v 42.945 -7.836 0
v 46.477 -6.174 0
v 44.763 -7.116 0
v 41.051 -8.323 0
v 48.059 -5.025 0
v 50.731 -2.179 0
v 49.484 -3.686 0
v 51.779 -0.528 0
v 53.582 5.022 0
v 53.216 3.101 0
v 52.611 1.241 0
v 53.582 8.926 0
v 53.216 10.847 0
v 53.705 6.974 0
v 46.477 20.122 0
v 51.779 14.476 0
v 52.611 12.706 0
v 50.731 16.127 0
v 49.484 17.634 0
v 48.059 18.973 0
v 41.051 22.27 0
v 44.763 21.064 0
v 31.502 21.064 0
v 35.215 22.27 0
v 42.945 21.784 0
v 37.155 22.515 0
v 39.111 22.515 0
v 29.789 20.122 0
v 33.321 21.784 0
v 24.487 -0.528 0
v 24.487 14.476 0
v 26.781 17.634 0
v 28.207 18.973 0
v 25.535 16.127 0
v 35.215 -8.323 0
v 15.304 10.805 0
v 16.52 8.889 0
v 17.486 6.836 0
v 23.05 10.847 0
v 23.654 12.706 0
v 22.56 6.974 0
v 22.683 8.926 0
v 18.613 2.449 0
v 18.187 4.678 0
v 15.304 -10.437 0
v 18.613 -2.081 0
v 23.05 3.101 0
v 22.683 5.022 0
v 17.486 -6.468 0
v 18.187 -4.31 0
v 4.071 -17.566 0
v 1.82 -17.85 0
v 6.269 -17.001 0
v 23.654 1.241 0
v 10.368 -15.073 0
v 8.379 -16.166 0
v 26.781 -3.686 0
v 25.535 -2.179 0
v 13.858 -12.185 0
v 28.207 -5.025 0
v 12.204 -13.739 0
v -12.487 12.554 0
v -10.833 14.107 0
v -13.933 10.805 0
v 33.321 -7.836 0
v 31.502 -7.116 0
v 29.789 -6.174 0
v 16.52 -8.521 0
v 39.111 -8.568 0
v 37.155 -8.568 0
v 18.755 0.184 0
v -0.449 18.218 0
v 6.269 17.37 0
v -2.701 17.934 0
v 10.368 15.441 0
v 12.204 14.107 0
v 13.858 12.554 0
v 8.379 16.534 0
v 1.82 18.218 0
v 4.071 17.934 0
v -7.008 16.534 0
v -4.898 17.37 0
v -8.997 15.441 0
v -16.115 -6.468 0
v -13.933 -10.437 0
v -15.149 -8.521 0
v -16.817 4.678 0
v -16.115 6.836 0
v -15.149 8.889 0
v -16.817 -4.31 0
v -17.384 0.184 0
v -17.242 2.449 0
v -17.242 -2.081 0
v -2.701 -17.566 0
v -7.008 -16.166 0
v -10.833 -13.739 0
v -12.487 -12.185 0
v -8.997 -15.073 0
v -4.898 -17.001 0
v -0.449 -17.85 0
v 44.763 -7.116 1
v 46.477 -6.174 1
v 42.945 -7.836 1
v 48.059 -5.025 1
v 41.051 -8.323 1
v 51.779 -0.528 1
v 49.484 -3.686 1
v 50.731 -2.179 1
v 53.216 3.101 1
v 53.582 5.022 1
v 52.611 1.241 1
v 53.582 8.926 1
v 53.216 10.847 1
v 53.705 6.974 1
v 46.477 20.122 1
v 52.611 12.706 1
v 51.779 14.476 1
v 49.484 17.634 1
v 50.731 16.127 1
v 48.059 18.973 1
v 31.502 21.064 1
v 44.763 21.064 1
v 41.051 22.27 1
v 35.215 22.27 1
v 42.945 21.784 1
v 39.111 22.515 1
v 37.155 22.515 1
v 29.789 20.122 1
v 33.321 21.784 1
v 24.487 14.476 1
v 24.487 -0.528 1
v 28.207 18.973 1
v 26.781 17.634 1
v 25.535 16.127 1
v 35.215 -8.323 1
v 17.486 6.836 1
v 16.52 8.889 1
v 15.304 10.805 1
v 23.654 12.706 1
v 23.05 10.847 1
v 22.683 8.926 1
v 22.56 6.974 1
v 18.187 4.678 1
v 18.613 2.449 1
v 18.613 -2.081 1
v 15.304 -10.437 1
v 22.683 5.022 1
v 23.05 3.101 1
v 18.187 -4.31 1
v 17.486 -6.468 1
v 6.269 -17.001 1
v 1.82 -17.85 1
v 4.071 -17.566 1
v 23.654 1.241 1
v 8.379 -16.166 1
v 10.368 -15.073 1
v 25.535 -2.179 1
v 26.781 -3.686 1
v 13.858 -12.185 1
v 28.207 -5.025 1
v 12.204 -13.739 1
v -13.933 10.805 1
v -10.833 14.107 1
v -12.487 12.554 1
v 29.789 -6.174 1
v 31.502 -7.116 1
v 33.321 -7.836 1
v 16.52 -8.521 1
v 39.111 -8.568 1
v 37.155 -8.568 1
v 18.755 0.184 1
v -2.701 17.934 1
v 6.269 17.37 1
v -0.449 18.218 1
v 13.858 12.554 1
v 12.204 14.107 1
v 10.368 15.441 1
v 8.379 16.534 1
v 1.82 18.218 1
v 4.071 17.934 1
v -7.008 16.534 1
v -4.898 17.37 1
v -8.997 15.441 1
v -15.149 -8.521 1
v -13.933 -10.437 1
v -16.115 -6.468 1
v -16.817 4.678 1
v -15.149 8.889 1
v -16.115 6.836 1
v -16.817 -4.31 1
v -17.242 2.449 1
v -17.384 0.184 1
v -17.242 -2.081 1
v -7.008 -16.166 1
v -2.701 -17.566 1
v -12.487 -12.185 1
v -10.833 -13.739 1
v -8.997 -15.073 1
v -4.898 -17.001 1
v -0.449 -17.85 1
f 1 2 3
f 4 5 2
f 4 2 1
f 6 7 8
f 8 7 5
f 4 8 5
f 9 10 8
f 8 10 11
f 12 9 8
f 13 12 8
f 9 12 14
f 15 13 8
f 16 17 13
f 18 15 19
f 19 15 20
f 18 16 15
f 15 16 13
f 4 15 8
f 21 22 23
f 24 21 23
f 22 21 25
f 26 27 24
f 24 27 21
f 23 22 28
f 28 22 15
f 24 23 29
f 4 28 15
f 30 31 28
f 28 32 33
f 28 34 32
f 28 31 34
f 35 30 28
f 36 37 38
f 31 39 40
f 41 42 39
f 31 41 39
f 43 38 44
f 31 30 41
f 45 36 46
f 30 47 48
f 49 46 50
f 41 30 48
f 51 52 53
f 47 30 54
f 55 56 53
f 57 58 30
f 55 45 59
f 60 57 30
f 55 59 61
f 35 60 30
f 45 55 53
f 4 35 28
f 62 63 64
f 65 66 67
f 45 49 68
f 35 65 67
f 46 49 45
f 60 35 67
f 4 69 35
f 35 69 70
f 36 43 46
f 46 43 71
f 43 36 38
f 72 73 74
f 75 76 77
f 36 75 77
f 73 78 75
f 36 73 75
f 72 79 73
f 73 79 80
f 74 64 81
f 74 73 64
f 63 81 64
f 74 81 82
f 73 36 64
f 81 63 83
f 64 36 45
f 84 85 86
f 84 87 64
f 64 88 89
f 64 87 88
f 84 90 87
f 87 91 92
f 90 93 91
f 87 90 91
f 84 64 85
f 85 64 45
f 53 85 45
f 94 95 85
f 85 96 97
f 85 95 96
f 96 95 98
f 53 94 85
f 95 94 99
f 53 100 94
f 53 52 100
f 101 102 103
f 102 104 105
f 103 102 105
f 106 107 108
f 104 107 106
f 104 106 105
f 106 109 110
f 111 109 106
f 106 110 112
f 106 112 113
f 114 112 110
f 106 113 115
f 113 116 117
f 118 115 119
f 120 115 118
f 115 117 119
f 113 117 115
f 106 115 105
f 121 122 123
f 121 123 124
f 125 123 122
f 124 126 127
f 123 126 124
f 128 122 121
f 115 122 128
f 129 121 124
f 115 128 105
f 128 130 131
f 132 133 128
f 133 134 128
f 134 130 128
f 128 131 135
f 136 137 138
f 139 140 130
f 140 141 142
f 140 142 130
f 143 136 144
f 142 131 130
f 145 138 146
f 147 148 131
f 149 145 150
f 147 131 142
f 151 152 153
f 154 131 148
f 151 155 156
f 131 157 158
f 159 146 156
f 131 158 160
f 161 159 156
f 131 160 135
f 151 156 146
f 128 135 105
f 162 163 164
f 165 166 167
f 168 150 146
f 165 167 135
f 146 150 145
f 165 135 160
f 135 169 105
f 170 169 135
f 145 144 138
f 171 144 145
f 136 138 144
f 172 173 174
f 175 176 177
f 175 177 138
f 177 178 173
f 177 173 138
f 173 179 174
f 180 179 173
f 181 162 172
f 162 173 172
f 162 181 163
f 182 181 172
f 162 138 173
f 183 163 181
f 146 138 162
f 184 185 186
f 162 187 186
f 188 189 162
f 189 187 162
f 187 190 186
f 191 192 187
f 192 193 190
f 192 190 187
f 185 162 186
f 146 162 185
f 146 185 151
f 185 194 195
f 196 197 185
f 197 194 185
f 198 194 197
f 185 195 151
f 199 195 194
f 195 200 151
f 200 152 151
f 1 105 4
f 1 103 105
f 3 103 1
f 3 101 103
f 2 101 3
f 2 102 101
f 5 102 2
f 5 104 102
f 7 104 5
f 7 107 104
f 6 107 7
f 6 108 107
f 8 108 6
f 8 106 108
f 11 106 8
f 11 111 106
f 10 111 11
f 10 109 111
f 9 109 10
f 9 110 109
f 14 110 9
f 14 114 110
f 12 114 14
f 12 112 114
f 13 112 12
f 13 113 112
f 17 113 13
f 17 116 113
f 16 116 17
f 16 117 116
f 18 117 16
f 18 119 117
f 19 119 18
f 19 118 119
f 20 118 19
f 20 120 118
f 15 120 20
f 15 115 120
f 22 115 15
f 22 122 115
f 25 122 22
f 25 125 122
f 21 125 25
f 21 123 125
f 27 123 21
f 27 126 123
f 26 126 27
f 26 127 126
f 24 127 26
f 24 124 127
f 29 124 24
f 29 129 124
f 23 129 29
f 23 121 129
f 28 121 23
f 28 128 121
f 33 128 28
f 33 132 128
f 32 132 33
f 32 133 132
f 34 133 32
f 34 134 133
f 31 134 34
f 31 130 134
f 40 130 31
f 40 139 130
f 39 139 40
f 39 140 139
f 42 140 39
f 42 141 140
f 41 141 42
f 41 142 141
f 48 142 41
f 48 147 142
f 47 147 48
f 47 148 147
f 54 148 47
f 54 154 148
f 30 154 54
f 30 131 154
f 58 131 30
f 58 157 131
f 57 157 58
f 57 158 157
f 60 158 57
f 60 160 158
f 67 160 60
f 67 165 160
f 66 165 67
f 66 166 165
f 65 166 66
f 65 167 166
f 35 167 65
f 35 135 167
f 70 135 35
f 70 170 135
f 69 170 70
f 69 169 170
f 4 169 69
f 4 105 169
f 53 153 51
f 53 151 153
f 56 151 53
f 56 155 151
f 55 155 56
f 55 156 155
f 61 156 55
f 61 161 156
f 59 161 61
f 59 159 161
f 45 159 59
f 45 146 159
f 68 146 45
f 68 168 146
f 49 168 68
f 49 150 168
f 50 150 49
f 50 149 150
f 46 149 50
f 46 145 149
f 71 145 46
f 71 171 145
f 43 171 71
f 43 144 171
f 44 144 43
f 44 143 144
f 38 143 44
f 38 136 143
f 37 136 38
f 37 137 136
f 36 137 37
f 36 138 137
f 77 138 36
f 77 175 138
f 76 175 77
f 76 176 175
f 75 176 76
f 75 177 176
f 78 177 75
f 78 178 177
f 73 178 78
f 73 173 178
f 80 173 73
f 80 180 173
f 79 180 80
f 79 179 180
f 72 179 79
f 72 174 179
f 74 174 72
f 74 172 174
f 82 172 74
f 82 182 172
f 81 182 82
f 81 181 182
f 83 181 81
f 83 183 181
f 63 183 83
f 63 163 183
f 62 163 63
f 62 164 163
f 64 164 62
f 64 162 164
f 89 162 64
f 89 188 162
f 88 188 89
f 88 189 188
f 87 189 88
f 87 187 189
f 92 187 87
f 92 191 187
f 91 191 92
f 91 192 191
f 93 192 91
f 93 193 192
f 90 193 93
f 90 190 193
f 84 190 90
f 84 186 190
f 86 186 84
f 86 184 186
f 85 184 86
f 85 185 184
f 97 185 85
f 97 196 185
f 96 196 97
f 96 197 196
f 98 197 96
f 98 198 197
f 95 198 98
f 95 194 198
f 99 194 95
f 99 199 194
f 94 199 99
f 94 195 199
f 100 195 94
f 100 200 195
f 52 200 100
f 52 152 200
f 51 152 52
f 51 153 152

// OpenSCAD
function Area_Of_Two_Intersecting_Circles(P1, P2,P1r,P2r) =
let(p1 = P1r * P1r,p2 = P2r * P2r )
(PI*p1+PI*p2)-
(
let(d = max(1e-32,norm(P2 -  P1)))
(d >= P1r + P2r) ?0:
d < abs(P2r - P1r)?PI * min(p1, p2):    
let( x = (p1 - p2 + d * d) / (2 * d),
z = x * x,  y = sqrt(p1 - z)) 
p1 * asin(y / P1r)/57.2958 + p2 * 
     asin(y / P2r)/57.2958 - y * 
     (x + sqrt(z + p2 - p1))             );
////////////////////////////////////////////////
p1=rands(0,40,2);
p2=rands(0,40,2);
r1=rands(1,20,1)[0];
r2=rands(1,20,1)[0];

echo(str(" Area 1 : ",PI*r1*r1," "));
echo(str(" Area 2 : ",PI*r2*r2," "));
echo(str(" Area ∑ : ",PI*r1*r1+PI*r2*r2)  );
echo(str(" Area  I : ",Area_Of_Two_Intersecting_Circles(p1,p2,r1,r2)));

linear_extrude(1) union(){
translate(p1)circle(r1,$fn=50);
translate(p2)circle(r2,$fn=50);
}
if(  norm(p2 -  p1)< r1 + r2 )color("red")linear_extrude(1.01)
intersection(){
translate(p1)circle(r1,$fn=50);
translate(p2)circle(r2,$fn=50);
}
